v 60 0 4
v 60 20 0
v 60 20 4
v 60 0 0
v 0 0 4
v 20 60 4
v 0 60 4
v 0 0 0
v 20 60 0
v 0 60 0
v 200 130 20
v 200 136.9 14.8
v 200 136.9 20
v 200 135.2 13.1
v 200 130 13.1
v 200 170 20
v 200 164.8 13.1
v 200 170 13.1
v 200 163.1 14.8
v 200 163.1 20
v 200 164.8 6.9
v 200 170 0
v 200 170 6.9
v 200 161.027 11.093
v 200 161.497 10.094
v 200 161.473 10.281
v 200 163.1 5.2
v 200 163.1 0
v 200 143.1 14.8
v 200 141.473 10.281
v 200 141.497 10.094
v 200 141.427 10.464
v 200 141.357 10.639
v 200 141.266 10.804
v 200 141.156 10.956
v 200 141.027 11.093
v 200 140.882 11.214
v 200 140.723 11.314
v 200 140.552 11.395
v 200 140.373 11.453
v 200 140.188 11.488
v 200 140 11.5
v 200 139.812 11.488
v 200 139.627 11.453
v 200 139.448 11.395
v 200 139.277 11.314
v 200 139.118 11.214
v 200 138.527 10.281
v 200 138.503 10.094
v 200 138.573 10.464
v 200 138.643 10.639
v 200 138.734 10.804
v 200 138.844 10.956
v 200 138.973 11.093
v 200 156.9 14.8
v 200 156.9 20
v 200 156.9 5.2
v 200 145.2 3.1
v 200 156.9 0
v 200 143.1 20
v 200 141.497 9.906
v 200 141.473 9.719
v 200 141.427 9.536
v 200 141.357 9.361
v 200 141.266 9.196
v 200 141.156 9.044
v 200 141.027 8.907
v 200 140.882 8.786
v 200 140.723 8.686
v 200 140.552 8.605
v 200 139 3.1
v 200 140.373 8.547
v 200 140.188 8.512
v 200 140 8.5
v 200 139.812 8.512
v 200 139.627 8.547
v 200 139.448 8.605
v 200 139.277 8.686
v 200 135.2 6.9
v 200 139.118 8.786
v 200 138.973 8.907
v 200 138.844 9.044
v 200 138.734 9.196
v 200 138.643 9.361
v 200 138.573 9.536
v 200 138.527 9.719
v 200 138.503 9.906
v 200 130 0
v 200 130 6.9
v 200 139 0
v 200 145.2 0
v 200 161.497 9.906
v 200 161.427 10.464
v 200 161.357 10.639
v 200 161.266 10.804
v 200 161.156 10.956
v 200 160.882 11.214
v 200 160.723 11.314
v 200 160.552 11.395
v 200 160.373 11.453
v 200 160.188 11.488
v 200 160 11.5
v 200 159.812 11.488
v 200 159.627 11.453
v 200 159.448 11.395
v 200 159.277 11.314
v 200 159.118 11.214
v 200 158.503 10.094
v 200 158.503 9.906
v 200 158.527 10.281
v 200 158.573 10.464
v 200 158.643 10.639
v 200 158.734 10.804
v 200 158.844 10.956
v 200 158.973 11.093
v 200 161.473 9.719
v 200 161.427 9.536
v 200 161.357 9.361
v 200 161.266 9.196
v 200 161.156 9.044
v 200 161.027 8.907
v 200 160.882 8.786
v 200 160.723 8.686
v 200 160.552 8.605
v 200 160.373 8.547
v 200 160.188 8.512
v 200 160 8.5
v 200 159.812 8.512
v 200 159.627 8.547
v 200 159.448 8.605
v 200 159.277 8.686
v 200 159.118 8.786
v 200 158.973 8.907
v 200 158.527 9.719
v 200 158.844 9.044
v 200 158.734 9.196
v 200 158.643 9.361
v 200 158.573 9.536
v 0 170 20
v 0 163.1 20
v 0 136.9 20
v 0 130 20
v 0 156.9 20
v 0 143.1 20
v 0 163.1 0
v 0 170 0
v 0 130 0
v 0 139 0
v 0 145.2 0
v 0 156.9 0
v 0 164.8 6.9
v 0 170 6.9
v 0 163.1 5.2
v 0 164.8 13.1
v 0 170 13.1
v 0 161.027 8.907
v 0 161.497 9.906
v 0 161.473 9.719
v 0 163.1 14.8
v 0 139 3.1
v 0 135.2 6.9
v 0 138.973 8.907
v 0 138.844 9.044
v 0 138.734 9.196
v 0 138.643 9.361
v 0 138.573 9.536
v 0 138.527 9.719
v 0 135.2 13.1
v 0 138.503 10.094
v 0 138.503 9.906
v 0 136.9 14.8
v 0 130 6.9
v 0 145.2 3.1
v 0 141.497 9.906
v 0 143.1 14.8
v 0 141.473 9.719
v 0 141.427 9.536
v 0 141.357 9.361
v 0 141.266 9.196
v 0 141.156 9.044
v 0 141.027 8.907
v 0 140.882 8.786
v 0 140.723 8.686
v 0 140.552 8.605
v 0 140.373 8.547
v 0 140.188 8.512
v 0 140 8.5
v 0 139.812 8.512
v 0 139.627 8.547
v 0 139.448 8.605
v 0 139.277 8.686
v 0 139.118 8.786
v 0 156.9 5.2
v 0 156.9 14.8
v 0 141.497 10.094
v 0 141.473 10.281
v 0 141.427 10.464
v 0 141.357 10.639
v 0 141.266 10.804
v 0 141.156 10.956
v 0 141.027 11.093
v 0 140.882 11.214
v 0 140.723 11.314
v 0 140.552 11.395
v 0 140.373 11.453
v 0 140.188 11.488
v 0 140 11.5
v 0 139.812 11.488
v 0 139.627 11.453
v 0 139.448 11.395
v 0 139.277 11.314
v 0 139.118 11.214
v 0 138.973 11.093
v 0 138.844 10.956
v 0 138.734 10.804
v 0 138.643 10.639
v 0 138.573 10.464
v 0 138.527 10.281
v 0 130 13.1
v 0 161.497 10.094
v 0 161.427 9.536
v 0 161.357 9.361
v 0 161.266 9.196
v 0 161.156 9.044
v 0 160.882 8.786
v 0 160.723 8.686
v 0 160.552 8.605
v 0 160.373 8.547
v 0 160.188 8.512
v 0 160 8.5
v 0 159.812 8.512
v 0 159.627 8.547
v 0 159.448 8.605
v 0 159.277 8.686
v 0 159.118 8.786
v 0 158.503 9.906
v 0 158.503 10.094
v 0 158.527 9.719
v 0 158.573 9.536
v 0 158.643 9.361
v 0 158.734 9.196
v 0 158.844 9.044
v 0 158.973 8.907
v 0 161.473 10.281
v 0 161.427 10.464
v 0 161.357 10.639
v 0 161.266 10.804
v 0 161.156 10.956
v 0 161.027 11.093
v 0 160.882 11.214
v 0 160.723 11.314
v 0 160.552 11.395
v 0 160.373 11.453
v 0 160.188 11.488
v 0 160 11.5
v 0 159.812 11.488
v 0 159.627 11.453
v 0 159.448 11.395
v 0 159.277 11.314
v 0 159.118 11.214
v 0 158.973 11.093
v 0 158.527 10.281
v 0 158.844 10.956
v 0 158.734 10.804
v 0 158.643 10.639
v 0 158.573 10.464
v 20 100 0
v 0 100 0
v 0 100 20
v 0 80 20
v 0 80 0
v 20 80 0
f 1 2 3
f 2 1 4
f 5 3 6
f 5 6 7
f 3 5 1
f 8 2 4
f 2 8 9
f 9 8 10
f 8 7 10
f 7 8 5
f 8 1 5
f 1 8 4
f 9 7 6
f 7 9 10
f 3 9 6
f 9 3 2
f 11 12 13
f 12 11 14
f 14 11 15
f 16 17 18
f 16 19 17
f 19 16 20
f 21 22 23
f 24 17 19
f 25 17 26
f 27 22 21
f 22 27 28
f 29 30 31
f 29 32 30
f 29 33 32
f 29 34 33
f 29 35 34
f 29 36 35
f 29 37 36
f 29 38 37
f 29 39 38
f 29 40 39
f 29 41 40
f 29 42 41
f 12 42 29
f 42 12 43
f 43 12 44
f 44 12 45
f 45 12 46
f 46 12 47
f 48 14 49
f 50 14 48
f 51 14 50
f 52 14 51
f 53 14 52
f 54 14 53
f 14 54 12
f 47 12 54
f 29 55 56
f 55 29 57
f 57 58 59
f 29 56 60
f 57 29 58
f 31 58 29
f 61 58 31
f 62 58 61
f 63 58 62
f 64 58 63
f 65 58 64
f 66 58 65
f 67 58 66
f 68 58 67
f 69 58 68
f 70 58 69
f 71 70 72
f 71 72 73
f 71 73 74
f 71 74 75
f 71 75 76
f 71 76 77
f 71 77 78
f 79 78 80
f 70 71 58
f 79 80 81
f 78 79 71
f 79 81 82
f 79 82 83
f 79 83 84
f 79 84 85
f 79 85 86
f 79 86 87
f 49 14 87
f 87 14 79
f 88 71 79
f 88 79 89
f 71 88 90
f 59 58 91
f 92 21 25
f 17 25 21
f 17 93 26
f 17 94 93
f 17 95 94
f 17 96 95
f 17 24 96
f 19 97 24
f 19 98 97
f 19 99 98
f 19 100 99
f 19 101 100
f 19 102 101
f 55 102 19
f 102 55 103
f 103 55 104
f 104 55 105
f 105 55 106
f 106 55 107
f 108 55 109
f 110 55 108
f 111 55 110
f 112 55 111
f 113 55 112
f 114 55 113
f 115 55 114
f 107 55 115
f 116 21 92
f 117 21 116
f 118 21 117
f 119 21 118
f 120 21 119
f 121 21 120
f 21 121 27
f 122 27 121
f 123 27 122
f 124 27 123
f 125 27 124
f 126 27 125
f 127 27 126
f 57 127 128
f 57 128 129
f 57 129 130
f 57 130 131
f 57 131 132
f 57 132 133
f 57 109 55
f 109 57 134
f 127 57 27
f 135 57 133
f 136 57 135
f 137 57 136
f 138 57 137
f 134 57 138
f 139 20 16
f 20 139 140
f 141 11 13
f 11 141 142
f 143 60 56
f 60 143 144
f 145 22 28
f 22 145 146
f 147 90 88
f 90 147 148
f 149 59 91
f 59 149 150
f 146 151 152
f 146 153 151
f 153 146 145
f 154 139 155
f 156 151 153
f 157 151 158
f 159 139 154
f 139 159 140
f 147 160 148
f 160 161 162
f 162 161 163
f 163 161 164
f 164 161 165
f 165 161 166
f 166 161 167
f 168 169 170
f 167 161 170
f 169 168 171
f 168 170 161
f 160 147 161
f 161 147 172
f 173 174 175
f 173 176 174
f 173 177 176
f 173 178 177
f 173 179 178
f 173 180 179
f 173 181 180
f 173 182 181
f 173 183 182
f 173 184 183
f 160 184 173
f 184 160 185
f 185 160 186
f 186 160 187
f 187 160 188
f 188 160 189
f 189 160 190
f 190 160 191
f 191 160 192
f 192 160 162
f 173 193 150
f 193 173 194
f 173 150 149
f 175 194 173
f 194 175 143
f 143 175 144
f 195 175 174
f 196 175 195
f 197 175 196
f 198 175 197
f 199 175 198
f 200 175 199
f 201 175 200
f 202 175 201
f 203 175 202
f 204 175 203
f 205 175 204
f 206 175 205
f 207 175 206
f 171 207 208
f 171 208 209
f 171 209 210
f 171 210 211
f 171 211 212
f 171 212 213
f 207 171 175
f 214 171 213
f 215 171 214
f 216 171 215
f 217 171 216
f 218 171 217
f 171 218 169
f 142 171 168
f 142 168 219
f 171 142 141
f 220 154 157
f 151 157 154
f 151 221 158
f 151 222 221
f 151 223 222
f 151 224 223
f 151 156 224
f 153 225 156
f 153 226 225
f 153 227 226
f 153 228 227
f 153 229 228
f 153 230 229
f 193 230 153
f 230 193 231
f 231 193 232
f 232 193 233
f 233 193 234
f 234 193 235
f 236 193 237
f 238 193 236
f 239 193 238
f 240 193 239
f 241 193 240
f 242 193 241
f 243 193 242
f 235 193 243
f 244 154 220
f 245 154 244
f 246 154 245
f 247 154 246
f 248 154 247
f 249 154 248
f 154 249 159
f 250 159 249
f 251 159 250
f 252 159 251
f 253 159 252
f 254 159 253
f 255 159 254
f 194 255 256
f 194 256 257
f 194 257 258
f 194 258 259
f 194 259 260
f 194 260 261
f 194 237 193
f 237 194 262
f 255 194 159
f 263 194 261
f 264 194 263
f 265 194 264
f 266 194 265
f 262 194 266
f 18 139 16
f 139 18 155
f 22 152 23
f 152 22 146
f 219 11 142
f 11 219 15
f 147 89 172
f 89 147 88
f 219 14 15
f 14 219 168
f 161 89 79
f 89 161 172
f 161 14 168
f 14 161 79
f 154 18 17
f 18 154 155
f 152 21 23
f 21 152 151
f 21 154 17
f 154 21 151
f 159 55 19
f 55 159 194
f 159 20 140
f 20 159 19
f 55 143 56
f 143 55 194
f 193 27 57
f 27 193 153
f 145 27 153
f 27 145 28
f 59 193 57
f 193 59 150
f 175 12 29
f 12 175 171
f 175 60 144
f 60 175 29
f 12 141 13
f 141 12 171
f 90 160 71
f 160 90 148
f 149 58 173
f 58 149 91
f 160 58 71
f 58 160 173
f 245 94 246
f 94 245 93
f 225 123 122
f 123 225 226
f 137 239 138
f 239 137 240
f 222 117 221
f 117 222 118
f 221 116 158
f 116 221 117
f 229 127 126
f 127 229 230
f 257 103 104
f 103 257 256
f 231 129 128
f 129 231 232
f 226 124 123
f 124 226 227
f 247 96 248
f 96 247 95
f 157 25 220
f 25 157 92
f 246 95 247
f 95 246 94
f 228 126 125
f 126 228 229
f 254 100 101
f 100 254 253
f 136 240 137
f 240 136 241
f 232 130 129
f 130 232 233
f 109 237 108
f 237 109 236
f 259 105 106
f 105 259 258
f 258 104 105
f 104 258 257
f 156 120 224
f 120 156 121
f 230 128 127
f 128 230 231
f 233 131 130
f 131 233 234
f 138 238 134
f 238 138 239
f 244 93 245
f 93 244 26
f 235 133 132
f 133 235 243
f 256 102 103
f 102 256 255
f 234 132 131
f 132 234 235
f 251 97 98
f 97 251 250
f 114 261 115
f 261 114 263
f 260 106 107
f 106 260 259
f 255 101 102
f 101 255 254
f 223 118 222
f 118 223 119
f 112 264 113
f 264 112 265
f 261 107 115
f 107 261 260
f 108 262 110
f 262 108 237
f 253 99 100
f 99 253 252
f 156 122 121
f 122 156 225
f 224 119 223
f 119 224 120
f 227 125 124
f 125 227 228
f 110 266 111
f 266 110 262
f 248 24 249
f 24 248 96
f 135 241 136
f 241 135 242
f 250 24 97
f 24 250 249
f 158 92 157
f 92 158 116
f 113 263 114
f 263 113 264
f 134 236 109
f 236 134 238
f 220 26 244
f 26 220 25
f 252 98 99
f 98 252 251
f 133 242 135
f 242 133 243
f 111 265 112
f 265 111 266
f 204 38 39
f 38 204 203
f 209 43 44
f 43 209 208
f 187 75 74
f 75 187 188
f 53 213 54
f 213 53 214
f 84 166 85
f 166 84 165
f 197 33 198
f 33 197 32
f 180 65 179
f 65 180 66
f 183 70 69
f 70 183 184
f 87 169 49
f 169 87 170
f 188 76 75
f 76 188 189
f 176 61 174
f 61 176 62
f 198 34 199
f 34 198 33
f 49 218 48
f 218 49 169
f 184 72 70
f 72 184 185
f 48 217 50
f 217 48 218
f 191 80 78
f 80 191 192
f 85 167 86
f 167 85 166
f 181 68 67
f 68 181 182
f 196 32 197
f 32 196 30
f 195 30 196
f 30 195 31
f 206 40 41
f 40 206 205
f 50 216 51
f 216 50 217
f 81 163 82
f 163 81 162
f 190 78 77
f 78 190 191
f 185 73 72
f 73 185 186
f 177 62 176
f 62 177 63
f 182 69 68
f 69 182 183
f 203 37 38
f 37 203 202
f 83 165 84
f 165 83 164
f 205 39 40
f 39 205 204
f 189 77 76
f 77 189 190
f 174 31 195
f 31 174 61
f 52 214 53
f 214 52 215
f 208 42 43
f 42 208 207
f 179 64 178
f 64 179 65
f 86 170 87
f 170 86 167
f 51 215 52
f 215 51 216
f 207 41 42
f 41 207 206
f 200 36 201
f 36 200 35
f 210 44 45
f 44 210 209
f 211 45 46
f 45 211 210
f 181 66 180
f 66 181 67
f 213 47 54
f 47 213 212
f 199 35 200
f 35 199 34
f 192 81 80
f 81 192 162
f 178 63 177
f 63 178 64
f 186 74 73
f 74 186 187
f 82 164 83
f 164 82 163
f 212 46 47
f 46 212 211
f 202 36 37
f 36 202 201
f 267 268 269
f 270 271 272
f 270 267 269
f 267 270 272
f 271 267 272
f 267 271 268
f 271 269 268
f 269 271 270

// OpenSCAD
// file: ../settings/dimensions.scad
// Defualt Quality
$fn = 50;

// PCB Dimensions - mm
pcb_l = 109.67;
pcb_w = 84.30;
pcb_t = 1.6;

hole_dia = 3.2;
hole_x_spacing = 101.85;
hole_y_spacing = 76.10;

// PCB Component Locations - mm from center
usb_x = (-pcb_l/2) + 24.11;
usb_y = (-pcb_w/2);

uSD_x = (-pcb_l/2) + 42.46;
uSD_y = (-pcb_w/2) - 0.71;

// TMC2130 Dimensions - mm
tmc_l = 20.32;
tmc_w = 15.24;
tmc_t = 1.6;
tmc_offset_from_pcb = 11.05;


// Global Enclosure Settings
pcb_mnt_pattern = [[0,0],[hole_x_spacing,0],[0,hole_y_spacing],[hole_x_spacing,hole_y_spacing]];
x_clearance = 25;
y_clearance = 15;
m3_clearance_dia = 3.2;
wall_height = 38;
// main file
include <../settings/dimensions.scad>

module alExt_2040(l) {
    translate([l/2,20,10]) {
        color("DimGray") {
            difference() {
                // main body
                cube([l,40,20], center=true);

                // slots
                translate([0,-(40/2)+(6.2/2)-1])cube([l+2,6.2,6.2], center=true);
                mirror([0,1,0])translate([0,-(40/2)+(6.2/2)-1])cube([l+2,6.2,6.2], center=true);

                translate([0,10,(20/2)-(6.2/2)+1])cube([l+2,6.2,6.2], center=true);
                mirror([0,0,1])translate([0,10,(20/2)-(6.2/2)+1])cube([l+2,6.2,6.2], center=true);
                mirror([0,1,0])translate([0,10,(20/2)-(6.2/2)+1])cube([l+2,6.2,6.2], center=true);
                mirror([0,1,1])translate([0,10,(20/2)-(6.2/2)+1])cube([l+2,6.2,6.2], center=true);

                // holes
                translate([0,10,0])rotate([0,90,0])cylinder(h=l+2, d=3, center=true);
                mirror([0,1,0])translate([0,10,0])rotate([0,90,0])cylinder(h=l+2, d=3, center=true);
            }
        }
    }
}

module angle_corner() {
    color("DimGrey") {
        translate([0,20,0]){
            rotate([90,0,0]) {
                linear_extrude(height=20)polygon([[0,0],[20,0], [0,20]]);
            }
        }
    }
}

module joining_plate() {
    color("DimGray") {
        union() {
            cube([60,20,4]);
            cube([20,60,4]);

            translate([20,20,0]) {
                linear_extrude(height=4)polygon([[0,0],[40,0],[0,40]]);
            }
        }
    }
}

// Sample of parts
joining_plate();
translate([0,80,0])angle_corner();
translate([0,130,0])alExt_2040(200);
